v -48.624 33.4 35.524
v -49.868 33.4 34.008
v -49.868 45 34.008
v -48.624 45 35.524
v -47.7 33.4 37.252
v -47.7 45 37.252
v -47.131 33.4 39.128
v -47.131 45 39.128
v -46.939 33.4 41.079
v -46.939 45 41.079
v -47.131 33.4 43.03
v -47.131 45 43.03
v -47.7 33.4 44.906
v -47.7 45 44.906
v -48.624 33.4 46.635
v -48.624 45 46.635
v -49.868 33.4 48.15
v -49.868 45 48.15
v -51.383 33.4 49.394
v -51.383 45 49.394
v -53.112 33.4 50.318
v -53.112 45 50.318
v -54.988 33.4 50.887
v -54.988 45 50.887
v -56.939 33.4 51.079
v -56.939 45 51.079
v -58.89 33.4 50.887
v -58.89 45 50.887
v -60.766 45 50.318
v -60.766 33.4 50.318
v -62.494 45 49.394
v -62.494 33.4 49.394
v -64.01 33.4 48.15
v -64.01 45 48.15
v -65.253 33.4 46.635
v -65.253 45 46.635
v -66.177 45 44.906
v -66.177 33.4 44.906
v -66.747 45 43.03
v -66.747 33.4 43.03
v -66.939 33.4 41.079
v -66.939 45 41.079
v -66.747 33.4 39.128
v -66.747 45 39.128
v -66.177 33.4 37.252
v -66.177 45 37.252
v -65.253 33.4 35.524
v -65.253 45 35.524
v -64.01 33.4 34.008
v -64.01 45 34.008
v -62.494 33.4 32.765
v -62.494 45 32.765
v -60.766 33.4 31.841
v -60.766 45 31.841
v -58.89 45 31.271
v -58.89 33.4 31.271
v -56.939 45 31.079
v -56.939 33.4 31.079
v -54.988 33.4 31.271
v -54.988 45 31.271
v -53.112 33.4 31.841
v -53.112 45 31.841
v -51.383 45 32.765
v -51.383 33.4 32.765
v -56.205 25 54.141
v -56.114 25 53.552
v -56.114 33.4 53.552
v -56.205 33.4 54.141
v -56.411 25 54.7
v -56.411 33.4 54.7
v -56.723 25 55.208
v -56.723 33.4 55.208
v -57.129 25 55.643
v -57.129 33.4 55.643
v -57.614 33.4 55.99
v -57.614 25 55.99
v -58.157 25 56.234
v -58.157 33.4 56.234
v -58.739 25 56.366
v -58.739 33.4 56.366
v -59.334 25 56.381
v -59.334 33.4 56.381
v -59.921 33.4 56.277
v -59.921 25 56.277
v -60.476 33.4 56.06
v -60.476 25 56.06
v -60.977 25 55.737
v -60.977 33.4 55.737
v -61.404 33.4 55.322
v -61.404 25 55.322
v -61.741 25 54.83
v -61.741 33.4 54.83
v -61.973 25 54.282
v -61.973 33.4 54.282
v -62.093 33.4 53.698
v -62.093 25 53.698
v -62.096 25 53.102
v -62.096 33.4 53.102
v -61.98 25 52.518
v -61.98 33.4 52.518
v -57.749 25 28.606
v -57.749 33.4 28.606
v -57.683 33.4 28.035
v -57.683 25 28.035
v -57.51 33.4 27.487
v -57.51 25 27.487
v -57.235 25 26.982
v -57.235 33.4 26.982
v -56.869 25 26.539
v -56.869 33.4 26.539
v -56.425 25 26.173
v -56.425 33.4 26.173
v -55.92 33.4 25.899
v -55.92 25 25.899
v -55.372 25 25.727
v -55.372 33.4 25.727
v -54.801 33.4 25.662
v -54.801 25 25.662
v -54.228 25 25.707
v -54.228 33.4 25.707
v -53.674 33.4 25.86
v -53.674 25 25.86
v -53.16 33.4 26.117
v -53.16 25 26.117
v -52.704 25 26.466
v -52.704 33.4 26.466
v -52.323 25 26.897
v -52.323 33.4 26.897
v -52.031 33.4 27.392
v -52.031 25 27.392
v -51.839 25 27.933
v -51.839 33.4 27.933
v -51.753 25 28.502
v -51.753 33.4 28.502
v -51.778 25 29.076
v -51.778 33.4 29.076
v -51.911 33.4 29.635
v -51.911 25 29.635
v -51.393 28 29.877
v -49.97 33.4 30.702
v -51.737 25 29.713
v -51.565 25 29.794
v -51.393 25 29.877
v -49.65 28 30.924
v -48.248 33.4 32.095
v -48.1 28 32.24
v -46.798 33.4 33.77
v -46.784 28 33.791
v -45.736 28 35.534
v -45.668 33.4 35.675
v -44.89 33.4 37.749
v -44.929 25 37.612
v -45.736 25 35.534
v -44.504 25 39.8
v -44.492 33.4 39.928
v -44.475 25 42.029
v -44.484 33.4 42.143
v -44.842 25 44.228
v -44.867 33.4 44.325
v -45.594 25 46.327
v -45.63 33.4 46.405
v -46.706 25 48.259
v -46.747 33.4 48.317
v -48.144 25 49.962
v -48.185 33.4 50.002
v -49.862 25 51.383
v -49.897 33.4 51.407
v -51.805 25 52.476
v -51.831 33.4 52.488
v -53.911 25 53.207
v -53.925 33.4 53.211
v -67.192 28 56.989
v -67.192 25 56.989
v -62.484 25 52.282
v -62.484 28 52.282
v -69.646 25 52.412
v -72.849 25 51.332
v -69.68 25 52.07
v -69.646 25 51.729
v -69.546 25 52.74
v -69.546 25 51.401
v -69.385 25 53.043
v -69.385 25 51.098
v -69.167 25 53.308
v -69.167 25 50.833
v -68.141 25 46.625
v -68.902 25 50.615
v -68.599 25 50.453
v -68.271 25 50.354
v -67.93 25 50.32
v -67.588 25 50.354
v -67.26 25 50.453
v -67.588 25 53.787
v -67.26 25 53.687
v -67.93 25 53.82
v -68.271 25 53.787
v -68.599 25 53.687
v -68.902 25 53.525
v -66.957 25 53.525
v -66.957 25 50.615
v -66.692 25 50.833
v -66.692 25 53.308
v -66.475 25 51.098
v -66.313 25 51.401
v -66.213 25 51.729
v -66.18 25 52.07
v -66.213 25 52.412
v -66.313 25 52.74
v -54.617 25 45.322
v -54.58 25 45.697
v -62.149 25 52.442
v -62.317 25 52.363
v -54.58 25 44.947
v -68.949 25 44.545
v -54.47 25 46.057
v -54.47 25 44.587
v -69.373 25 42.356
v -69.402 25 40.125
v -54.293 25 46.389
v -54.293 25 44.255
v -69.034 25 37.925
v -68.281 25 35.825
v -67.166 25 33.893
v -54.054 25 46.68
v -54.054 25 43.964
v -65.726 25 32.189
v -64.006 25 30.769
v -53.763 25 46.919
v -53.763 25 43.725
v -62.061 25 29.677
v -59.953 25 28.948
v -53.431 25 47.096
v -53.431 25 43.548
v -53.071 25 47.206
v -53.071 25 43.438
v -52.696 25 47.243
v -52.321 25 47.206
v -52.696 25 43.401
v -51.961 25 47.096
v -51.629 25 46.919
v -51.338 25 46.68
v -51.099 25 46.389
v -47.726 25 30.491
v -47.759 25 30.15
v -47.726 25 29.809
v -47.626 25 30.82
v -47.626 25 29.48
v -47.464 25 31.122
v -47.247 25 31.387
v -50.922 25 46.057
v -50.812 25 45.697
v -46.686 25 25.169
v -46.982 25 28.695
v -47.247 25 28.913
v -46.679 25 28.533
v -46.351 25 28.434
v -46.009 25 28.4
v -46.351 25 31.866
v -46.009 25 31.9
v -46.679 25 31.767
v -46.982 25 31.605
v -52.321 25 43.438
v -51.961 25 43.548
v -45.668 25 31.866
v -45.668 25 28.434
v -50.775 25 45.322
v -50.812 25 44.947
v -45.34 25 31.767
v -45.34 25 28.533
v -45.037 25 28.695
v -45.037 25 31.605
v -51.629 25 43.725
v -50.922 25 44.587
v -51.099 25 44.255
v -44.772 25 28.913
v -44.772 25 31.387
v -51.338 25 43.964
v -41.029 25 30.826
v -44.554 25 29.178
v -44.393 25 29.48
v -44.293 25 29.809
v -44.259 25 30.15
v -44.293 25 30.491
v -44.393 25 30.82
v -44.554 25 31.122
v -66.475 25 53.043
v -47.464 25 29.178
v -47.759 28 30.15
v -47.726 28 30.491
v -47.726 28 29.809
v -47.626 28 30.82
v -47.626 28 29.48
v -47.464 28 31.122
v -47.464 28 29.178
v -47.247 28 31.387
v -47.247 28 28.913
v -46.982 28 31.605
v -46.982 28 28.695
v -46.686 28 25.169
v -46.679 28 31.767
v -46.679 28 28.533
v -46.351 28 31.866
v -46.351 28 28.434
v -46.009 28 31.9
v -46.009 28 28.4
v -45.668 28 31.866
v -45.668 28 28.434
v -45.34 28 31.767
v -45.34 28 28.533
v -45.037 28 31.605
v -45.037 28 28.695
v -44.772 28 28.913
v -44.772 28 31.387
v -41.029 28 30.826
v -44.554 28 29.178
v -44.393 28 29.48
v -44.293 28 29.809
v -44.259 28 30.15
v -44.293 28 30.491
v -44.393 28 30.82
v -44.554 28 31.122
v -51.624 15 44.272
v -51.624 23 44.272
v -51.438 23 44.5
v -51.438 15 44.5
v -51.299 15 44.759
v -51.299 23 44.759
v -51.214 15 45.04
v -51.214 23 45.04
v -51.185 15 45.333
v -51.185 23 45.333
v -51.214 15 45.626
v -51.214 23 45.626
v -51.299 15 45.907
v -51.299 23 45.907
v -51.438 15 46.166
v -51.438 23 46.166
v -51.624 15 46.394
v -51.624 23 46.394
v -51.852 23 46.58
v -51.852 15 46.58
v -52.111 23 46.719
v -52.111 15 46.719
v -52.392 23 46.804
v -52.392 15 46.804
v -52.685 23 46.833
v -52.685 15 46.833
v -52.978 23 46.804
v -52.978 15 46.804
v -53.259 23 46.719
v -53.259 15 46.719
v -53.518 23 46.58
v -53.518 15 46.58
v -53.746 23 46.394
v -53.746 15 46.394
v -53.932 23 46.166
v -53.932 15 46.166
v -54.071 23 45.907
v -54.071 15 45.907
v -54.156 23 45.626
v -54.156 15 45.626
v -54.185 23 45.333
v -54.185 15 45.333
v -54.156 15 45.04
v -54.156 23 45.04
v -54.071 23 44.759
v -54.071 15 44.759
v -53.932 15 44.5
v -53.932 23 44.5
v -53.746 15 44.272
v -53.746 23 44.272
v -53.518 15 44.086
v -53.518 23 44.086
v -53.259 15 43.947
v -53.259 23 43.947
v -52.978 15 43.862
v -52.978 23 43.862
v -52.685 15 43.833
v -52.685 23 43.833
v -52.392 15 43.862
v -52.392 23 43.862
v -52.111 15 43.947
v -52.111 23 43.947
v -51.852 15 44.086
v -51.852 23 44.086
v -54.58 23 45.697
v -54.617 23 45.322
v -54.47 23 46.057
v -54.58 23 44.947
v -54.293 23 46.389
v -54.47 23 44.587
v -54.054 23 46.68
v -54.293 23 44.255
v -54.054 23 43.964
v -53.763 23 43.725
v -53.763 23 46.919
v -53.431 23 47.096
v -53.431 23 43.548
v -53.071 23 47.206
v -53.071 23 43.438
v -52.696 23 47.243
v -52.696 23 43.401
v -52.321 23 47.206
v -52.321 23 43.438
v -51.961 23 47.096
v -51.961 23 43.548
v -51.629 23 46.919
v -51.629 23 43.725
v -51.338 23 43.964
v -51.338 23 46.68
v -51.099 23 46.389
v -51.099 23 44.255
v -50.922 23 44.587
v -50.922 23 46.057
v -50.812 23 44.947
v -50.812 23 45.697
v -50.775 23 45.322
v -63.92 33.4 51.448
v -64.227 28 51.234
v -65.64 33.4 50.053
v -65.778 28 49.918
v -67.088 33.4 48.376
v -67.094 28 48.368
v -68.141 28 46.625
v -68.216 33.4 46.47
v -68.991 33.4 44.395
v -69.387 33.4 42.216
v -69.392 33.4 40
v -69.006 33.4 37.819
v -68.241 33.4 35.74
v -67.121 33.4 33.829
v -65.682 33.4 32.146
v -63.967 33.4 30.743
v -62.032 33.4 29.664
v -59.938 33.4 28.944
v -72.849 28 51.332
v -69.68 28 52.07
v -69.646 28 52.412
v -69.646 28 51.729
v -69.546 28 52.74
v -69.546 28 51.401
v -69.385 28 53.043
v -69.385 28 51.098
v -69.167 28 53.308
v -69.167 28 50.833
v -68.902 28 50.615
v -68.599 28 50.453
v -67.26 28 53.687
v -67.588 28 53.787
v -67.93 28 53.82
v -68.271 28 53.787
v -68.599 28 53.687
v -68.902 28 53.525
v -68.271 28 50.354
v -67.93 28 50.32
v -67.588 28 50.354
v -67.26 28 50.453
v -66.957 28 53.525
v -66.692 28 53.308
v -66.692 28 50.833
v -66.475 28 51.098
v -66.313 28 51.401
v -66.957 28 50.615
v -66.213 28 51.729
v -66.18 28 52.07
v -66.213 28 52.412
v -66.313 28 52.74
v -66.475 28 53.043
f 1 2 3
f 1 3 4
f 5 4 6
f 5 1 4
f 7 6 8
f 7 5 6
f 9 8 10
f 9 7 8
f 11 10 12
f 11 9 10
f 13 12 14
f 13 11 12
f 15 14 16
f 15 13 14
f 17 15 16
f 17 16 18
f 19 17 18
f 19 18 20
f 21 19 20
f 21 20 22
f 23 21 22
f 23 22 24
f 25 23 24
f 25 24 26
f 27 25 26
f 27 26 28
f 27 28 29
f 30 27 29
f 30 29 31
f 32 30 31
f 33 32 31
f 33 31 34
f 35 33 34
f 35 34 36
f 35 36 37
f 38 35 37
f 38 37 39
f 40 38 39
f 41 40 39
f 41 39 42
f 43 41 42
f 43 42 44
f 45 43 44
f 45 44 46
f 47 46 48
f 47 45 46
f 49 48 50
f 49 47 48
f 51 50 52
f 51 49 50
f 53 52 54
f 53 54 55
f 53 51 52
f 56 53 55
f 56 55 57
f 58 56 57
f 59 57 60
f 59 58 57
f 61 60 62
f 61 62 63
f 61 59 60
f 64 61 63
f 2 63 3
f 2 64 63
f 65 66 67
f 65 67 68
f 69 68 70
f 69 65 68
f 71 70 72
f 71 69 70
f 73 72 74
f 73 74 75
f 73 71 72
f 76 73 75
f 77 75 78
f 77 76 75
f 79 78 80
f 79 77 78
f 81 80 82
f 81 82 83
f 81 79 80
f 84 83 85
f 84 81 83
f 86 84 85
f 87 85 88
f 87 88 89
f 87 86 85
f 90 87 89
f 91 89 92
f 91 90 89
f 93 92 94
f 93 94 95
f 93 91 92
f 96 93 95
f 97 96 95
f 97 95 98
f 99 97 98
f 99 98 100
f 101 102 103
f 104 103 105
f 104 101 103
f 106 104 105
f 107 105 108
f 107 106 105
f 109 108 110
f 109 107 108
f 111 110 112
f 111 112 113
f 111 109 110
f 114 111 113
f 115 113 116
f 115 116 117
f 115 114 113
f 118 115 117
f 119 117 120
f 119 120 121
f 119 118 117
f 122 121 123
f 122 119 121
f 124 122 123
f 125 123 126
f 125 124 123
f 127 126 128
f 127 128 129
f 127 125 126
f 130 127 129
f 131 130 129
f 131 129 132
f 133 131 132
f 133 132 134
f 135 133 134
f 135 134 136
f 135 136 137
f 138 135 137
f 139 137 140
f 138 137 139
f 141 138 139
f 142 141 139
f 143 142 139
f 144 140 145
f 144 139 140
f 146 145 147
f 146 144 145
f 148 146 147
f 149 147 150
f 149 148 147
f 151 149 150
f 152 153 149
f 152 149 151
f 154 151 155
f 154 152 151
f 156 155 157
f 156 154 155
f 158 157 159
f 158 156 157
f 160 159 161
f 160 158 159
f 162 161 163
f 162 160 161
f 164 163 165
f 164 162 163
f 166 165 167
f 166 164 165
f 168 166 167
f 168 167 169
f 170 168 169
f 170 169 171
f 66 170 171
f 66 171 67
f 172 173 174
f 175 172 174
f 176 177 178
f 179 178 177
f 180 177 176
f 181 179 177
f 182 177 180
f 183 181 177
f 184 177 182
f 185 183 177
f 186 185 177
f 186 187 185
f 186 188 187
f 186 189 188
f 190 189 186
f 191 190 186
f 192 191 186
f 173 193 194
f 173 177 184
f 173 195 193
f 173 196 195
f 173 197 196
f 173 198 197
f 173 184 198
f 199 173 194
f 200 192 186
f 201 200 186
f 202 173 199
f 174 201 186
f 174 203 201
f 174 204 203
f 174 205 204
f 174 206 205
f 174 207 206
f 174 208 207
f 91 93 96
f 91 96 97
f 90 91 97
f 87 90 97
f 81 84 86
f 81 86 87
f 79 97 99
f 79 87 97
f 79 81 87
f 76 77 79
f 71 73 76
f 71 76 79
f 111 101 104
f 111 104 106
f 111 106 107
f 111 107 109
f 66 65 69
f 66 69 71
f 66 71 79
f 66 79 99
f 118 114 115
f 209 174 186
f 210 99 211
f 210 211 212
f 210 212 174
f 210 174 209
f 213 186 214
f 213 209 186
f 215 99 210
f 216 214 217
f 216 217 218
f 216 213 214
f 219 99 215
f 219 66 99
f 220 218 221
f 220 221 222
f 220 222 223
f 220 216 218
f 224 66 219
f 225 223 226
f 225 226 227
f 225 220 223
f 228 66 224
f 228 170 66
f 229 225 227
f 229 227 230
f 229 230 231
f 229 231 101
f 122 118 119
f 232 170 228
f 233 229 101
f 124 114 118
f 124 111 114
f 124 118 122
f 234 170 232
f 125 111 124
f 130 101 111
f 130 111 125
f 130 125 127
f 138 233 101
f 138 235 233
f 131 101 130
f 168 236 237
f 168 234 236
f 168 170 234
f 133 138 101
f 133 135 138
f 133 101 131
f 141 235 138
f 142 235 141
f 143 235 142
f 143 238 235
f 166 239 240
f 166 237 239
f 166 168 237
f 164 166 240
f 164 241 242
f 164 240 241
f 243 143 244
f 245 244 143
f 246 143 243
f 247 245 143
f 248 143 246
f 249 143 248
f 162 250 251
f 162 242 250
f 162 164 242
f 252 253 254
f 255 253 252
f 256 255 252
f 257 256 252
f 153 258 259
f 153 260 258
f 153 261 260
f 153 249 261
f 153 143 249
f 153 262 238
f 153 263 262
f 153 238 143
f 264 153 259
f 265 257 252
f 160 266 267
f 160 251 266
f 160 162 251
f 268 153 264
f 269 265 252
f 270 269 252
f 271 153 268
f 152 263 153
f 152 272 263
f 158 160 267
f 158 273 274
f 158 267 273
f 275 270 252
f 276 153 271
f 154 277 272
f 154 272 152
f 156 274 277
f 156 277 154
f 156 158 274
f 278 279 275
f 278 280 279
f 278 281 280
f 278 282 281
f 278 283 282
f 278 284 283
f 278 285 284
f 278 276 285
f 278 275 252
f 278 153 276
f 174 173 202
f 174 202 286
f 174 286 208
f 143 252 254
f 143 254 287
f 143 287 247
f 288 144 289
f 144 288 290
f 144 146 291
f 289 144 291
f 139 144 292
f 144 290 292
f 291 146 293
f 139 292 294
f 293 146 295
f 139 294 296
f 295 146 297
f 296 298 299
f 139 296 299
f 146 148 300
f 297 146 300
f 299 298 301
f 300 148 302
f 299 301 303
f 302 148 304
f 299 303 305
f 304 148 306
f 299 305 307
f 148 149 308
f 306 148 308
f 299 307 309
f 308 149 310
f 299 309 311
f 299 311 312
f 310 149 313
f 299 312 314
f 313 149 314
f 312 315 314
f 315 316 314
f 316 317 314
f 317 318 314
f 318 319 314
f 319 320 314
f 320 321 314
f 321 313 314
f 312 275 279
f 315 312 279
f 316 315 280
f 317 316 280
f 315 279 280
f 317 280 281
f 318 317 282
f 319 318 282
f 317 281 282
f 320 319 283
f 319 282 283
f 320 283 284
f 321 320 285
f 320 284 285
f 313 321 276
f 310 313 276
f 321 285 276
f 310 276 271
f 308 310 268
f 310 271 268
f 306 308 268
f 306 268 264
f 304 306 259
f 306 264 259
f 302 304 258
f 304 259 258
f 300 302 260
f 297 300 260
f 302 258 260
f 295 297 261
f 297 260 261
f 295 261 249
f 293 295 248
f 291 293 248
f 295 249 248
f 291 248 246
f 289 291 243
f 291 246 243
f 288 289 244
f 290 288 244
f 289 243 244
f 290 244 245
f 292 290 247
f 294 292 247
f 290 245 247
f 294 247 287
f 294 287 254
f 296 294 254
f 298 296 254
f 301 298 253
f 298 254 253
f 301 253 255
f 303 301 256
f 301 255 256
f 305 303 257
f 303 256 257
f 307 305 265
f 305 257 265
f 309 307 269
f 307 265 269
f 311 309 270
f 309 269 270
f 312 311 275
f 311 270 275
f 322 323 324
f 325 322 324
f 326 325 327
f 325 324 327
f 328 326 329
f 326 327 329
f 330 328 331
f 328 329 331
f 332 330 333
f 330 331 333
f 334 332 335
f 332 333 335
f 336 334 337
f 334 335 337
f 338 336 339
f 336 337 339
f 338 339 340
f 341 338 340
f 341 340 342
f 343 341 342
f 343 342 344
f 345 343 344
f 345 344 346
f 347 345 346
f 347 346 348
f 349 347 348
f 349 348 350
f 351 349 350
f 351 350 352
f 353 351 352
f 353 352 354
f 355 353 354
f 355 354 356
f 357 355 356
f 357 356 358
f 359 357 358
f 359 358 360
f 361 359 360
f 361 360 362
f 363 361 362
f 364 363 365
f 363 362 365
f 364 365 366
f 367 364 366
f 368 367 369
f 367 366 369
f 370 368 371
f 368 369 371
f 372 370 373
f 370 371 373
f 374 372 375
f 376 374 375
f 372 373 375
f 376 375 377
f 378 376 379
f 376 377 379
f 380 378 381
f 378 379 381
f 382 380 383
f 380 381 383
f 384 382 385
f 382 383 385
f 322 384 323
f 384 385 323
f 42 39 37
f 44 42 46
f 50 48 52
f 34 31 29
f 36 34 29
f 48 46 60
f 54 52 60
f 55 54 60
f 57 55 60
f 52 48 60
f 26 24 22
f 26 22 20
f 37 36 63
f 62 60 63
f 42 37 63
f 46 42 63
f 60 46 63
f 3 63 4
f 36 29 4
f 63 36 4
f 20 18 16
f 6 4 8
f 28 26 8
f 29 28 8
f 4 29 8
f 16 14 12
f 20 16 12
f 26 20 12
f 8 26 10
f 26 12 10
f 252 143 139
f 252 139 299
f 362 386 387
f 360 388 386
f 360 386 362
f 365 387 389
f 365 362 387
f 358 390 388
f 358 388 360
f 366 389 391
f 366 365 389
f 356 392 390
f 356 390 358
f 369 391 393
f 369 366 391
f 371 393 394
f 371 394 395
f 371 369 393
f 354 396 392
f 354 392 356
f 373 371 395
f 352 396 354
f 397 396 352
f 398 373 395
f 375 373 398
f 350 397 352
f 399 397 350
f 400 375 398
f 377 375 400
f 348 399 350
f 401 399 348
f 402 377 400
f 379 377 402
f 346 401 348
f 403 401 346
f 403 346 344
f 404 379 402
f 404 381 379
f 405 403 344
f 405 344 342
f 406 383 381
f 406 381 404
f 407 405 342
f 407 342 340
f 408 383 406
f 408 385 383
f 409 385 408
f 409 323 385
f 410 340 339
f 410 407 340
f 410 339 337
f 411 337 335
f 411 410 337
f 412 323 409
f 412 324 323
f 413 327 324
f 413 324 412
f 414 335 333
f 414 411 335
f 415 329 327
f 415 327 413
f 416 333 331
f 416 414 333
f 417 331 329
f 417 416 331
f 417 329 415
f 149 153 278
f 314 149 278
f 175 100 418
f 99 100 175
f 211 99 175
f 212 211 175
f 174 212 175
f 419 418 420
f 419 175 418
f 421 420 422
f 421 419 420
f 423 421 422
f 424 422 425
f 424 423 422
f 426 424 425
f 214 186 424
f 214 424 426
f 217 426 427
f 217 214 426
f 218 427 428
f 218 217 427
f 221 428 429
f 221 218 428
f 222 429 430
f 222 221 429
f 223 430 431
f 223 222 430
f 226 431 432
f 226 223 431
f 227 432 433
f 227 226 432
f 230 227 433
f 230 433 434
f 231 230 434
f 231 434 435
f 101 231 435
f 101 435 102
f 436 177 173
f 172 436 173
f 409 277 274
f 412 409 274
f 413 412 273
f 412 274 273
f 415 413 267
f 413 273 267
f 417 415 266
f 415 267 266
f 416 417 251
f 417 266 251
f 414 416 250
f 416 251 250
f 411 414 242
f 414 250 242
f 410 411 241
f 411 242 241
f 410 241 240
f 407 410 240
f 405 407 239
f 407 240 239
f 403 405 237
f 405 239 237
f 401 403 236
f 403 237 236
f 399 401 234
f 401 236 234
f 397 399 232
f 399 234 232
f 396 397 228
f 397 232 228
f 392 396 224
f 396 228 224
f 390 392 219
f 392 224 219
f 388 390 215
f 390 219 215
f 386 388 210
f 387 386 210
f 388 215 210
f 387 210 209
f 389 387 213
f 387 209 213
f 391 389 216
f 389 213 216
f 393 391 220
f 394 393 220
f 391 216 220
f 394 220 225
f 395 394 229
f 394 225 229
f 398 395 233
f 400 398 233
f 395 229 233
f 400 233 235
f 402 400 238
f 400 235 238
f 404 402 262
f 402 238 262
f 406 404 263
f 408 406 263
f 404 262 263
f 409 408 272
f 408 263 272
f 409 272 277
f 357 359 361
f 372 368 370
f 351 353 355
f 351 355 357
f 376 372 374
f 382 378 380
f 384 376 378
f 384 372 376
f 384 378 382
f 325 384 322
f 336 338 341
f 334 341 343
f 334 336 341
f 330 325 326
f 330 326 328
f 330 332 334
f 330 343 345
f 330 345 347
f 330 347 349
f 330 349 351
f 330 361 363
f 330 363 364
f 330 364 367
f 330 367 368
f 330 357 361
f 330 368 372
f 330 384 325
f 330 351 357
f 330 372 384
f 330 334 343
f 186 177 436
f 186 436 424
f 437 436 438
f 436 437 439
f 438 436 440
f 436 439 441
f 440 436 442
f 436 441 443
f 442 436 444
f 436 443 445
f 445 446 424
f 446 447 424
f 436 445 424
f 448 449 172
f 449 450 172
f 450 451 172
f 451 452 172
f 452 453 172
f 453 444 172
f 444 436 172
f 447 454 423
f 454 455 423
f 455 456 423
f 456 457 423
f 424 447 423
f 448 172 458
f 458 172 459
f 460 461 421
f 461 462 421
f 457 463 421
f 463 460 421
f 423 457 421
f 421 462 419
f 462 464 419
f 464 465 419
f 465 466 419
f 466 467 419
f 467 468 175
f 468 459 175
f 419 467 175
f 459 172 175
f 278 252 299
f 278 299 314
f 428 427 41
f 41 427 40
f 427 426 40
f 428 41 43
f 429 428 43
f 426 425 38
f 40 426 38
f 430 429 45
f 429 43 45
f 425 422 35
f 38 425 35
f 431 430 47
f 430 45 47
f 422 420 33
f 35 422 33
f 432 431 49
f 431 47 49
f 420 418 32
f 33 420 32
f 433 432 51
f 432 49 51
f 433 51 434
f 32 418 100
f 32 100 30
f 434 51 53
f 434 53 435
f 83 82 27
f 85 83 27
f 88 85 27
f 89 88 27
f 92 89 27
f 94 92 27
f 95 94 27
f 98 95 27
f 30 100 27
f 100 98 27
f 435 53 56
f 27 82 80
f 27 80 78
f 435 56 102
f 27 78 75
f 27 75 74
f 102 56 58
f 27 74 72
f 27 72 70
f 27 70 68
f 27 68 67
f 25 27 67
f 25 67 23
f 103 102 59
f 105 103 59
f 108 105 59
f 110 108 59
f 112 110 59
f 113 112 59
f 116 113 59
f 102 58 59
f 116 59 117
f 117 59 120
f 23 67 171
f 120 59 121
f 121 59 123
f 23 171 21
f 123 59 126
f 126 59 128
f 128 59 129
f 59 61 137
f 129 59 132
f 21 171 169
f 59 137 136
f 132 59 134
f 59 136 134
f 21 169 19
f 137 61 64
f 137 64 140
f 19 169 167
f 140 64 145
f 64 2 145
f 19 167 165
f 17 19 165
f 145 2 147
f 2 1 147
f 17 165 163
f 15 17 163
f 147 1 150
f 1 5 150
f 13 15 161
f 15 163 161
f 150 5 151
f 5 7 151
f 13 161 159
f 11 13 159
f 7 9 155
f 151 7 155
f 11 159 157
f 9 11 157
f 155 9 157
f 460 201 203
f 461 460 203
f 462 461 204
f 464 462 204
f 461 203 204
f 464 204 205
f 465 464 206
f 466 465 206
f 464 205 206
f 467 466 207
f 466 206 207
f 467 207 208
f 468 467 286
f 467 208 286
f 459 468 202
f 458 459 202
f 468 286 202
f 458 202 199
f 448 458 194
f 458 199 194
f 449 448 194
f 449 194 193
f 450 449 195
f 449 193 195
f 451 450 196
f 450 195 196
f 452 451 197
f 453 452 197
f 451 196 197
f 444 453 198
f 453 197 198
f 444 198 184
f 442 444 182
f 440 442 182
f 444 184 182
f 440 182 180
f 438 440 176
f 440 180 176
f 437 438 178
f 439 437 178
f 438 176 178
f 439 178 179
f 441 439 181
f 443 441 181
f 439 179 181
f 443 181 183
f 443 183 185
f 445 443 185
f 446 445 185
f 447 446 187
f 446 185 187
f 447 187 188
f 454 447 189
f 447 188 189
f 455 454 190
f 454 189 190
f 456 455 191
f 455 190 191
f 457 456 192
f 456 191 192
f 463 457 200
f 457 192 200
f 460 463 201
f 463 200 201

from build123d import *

# Parameters (mm, degrees)
SKETCH028_W              = 37
SKETCH028_H              = 8
SKETCH028_R              = 1.75
PAD016_DEPTH             = 3
PAD017_DEPTH             = 8.4
SKETCH030_R              = 10
PAD018_DEPTH             = 20
SKETCH031_R              = 1.920563
PAD019_DEPTH             = 2
SKETCH032_R              = 1.5
PAD020_DEPTH             = 10
BODY008_ROLL_ANGLE       = -90
BODY008_PITCH_ANGLE      = -30
BODY008_PLACEMENT_ANGLE  = 180
CLONE001_PLACEMENT_ANGLE = 210
BODY009_PLACEMENT_ANGLE  = 45


with BuildPart() as part:
    # Sketch028 → Pad016 (new body)
    with BuildSketch(Plane.XY):
        Rectangle(SKETCH028_W, SKETCH028_H)
        with Locations((15.456405, 0)):
            Circle(SKETCH028_R, mode=Mode.SUBTRACT)
        with Locations((-15.543595, 0)):
            Circle(SKETCH028_R, mode=Mode.SUBTRACT)
    extrude(amount=-PAD016_DEPTH)

    # Sketch029 → Pad017 (join)
    with BuildSketch(Plane.XY):
        with BuildLine():
            ThreePointArc((-11.652801, 4.52352), (-7.163489, -10.243751), (8.24762, -9.392911))
            ThreePointArc((8.24762, -9.392911), (12.786665, -8.95332), (11.647301, -4.537663))
            ThreePointArc((11.647301, -4.537663), (7.175919, 10.235047), (-8.236211, 9.402916))
            ThreePointArc((-8.236211, 9.402916), (-12.696857, 8.890435), (-11.652801, 4.52352))
        make_face()
    extrude(amount=-PAD017_DEPTH)

    # Sketch030 → Pad018 (join)
    with BuildSketch(Plane.XY):
        Circle(SKETCH030_R)
    extrude(amount=-PAD018_DEPTH)

    # Sketch031 → Pad019 (join)
    with BuildSketch(Plane.XY):
        with Locations((0, 6)):
            Circle(SKETCH031_R)
    extrude(amount=PAD019_DEPTH)

    # Sketch032 → Pad020 (join)
    with BuildSketch(Plane.XY):
        with Locations((0, 6.01563)):
            Circle(SKETCH032_R)
    extrude(amount=PAD020_DEPTH)


with BuildPart() as part_1:
    # Body008 roll: moved
    add(part.part.rotate(Axis((0, 0, 0), (1, 0, 0)), BODY008_ROLL_ANGLE))


with BuildPart() as part_2:
    # Body008 pitch: moved
    add(part_1.part.rotate(Axis((0, 0, 0), (0, 1, 0)), BODY008_PITCH_ANGLE))


with BuildPart() as part_3:
    # Body008 placement: moved
    add(part_2.part.moved(Location((-56.598076, 17, -9.800515))).rotate(Axis((-56.598076, 17, -9.800515), (0, 0, 1)), BODY008_PLACEMENT_ANGLE))


with BuildPart() as part_4:
    # Clone001 placement: moved
    add(part_3.part.moved(Location((-103.715114, 0, -57.786533))).rotate(Axis((-103.715114, 0, -57.786533), (0, -1, 0)), CLONE001_PLACEMENT_ANGLE))


with BuildPart() as part_5:
    # Body009 placement: moved
    add(part_4.part.moved(Location((0.05412, 8, 13.784986))).rotate(Axis((0.05412, 8, 13.784986), (0, 1, 0)), BODY009_PLACEMENT_ANGLE))


solid = part_5.part
